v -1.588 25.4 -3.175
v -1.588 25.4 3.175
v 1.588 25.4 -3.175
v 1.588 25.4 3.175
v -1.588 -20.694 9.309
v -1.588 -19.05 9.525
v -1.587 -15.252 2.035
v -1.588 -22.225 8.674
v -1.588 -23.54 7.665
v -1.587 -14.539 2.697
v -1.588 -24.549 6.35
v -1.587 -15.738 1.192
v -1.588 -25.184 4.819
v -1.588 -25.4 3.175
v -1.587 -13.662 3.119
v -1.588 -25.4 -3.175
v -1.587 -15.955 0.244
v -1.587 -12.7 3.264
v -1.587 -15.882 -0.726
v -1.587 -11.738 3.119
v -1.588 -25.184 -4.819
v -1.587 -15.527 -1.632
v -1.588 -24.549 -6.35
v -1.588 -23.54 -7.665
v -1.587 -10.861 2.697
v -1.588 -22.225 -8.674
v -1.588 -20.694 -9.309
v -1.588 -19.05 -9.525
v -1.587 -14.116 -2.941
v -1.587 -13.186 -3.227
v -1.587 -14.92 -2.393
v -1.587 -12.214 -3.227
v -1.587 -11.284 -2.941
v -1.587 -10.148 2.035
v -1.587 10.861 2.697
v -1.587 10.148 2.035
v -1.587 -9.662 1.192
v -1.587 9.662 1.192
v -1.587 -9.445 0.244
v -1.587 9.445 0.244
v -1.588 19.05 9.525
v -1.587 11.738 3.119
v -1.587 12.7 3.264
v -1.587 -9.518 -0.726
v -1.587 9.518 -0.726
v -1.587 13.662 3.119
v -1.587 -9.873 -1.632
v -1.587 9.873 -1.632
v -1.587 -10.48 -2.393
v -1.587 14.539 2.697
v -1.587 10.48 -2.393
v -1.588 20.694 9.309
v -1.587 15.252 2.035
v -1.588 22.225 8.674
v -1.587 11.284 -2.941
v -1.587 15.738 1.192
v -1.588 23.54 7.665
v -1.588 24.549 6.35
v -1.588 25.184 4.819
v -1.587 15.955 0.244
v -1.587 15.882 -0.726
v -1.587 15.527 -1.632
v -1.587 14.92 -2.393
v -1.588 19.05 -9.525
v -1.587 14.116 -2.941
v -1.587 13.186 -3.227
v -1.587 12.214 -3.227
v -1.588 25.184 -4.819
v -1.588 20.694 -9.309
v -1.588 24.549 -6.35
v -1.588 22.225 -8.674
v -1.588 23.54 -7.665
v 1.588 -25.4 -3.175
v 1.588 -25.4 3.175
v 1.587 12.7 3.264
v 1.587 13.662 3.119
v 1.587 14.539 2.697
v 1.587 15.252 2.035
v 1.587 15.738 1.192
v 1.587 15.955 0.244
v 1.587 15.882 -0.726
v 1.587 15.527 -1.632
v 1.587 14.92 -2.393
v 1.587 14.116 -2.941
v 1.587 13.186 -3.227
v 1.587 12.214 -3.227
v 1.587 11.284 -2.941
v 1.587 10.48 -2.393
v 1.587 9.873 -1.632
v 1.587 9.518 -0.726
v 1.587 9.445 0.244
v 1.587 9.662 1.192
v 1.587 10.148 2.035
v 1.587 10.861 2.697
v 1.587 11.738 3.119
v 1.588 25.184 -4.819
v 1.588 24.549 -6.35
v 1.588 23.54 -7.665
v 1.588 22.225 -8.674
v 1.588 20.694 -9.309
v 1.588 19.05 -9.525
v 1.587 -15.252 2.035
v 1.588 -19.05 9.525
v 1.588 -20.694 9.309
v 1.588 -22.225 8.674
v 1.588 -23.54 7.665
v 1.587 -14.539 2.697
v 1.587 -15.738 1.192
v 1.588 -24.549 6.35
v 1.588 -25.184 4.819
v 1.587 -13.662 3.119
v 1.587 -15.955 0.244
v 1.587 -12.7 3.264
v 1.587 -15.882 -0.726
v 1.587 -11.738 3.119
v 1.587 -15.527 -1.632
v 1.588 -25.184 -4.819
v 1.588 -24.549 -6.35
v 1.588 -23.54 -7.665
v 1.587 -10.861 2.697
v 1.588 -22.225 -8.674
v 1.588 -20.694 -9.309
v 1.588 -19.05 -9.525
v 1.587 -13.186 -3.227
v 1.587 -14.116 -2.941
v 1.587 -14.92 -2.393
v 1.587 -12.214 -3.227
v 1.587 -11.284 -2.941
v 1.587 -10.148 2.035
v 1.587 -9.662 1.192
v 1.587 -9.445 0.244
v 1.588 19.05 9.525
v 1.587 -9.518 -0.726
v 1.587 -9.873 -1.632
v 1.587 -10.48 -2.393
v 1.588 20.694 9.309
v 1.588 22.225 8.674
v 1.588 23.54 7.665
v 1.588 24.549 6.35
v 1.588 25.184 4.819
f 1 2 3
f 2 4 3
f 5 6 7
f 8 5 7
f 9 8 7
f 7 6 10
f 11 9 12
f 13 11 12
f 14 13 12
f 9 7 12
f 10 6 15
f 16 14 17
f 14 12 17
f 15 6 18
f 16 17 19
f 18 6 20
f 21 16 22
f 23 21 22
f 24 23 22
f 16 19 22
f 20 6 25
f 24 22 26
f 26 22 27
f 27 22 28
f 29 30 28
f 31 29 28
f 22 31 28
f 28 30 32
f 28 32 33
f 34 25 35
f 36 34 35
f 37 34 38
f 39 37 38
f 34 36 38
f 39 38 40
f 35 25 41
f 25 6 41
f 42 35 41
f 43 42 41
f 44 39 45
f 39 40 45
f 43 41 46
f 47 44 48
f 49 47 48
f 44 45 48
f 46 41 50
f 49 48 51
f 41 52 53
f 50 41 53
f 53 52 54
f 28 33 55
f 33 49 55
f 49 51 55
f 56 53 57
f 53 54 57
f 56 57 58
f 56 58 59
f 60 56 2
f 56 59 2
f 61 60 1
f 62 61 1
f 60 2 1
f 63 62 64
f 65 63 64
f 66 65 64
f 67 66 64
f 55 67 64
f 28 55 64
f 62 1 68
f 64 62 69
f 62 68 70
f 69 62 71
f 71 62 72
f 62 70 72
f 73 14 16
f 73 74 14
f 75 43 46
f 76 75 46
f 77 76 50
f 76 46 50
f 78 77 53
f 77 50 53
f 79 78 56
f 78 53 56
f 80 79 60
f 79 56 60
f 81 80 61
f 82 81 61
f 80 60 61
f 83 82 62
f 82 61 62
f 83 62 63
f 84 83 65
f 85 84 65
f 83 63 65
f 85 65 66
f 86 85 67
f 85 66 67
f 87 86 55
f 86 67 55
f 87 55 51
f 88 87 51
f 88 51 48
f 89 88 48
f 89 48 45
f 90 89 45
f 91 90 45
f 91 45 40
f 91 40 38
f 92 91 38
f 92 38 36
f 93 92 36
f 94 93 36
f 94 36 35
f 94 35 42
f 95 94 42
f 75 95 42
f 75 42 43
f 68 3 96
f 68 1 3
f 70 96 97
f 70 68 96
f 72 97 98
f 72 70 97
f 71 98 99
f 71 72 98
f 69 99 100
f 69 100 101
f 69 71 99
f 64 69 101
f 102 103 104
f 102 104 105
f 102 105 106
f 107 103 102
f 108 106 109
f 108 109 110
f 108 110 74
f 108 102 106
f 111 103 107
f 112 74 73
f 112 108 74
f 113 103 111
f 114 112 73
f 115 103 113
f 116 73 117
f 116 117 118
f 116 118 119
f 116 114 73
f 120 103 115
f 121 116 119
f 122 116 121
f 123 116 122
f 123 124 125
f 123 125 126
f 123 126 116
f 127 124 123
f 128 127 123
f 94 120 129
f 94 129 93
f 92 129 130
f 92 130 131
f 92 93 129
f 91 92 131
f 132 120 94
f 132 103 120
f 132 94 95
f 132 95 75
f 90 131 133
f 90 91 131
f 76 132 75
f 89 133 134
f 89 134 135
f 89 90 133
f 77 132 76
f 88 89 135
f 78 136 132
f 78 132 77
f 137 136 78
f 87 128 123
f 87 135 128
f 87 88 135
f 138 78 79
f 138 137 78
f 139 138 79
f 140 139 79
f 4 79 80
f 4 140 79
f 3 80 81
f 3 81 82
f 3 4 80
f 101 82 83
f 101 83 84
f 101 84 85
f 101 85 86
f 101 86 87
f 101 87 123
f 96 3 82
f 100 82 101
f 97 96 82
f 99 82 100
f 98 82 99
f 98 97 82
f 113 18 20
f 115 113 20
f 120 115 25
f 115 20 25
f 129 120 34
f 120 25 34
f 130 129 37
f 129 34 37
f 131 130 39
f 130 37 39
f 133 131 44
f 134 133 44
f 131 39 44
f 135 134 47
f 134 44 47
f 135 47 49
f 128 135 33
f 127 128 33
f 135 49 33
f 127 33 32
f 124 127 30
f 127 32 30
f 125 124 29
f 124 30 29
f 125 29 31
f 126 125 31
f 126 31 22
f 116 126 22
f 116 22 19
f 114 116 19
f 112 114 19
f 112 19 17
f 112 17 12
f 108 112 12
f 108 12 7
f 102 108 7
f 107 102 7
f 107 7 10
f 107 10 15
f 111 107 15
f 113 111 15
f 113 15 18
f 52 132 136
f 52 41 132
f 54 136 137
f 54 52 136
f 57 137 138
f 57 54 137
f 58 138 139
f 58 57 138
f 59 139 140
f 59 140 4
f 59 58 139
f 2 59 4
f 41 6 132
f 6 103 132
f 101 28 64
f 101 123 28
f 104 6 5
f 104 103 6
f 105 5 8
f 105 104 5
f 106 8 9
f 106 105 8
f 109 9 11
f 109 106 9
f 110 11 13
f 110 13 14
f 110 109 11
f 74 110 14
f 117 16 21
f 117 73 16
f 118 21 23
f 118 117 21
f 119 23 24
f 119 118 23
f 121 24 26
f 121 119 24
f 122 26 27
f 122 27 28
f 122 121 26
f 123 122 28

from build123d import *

# Parameters (mm, degrees)
SKETCH1_W               = 19.05
SKETCH1_H               = 50.8
BOSS_EXTRUDE1_DEPTH     = 1.5875
F_1_4_CLEARANCE_HOLE1_D = 6.5278
FILLET1_R               = 6.35


with BuildPart() as part:
    # Sketch1 → Boss-Extrude1 (new, symmetric)
    with BuildSketch(Plane(origin=(0, 0, 0), x_dir=(0, 0, -1), z_dir=(1, 0, 0))):
        Rectangle(SKETCH1_W, SKETCH1_H)
    extrude(amount=BOSS_EXTRUDE1_DEPTH, both=True)

    # 1/4 Clearance Hole1 (through all)
    with Locations(Plane(origin=(1.5875, 0, 0), x_dir=(0, 0, -1), z_dir=(1, 0, 0))):
        with Locations((0, 12.7), (0, -12.7)):
            Hole(F_1_4_CLEARANCE_HOLE1_D / 2)

    # Fillet1
    fillet1_edges = [part.edges().sort_by_distance(p)[0] for p in [
        (0, -25.4, -9.525),
        (0, -25.4, 9.525),
        (0, 25.4, 9.525),
        (0, 25.4, -9.525),
    ]]
    fillet(fillet1_edges, radius=FILLET1_R)


solid = part.part
